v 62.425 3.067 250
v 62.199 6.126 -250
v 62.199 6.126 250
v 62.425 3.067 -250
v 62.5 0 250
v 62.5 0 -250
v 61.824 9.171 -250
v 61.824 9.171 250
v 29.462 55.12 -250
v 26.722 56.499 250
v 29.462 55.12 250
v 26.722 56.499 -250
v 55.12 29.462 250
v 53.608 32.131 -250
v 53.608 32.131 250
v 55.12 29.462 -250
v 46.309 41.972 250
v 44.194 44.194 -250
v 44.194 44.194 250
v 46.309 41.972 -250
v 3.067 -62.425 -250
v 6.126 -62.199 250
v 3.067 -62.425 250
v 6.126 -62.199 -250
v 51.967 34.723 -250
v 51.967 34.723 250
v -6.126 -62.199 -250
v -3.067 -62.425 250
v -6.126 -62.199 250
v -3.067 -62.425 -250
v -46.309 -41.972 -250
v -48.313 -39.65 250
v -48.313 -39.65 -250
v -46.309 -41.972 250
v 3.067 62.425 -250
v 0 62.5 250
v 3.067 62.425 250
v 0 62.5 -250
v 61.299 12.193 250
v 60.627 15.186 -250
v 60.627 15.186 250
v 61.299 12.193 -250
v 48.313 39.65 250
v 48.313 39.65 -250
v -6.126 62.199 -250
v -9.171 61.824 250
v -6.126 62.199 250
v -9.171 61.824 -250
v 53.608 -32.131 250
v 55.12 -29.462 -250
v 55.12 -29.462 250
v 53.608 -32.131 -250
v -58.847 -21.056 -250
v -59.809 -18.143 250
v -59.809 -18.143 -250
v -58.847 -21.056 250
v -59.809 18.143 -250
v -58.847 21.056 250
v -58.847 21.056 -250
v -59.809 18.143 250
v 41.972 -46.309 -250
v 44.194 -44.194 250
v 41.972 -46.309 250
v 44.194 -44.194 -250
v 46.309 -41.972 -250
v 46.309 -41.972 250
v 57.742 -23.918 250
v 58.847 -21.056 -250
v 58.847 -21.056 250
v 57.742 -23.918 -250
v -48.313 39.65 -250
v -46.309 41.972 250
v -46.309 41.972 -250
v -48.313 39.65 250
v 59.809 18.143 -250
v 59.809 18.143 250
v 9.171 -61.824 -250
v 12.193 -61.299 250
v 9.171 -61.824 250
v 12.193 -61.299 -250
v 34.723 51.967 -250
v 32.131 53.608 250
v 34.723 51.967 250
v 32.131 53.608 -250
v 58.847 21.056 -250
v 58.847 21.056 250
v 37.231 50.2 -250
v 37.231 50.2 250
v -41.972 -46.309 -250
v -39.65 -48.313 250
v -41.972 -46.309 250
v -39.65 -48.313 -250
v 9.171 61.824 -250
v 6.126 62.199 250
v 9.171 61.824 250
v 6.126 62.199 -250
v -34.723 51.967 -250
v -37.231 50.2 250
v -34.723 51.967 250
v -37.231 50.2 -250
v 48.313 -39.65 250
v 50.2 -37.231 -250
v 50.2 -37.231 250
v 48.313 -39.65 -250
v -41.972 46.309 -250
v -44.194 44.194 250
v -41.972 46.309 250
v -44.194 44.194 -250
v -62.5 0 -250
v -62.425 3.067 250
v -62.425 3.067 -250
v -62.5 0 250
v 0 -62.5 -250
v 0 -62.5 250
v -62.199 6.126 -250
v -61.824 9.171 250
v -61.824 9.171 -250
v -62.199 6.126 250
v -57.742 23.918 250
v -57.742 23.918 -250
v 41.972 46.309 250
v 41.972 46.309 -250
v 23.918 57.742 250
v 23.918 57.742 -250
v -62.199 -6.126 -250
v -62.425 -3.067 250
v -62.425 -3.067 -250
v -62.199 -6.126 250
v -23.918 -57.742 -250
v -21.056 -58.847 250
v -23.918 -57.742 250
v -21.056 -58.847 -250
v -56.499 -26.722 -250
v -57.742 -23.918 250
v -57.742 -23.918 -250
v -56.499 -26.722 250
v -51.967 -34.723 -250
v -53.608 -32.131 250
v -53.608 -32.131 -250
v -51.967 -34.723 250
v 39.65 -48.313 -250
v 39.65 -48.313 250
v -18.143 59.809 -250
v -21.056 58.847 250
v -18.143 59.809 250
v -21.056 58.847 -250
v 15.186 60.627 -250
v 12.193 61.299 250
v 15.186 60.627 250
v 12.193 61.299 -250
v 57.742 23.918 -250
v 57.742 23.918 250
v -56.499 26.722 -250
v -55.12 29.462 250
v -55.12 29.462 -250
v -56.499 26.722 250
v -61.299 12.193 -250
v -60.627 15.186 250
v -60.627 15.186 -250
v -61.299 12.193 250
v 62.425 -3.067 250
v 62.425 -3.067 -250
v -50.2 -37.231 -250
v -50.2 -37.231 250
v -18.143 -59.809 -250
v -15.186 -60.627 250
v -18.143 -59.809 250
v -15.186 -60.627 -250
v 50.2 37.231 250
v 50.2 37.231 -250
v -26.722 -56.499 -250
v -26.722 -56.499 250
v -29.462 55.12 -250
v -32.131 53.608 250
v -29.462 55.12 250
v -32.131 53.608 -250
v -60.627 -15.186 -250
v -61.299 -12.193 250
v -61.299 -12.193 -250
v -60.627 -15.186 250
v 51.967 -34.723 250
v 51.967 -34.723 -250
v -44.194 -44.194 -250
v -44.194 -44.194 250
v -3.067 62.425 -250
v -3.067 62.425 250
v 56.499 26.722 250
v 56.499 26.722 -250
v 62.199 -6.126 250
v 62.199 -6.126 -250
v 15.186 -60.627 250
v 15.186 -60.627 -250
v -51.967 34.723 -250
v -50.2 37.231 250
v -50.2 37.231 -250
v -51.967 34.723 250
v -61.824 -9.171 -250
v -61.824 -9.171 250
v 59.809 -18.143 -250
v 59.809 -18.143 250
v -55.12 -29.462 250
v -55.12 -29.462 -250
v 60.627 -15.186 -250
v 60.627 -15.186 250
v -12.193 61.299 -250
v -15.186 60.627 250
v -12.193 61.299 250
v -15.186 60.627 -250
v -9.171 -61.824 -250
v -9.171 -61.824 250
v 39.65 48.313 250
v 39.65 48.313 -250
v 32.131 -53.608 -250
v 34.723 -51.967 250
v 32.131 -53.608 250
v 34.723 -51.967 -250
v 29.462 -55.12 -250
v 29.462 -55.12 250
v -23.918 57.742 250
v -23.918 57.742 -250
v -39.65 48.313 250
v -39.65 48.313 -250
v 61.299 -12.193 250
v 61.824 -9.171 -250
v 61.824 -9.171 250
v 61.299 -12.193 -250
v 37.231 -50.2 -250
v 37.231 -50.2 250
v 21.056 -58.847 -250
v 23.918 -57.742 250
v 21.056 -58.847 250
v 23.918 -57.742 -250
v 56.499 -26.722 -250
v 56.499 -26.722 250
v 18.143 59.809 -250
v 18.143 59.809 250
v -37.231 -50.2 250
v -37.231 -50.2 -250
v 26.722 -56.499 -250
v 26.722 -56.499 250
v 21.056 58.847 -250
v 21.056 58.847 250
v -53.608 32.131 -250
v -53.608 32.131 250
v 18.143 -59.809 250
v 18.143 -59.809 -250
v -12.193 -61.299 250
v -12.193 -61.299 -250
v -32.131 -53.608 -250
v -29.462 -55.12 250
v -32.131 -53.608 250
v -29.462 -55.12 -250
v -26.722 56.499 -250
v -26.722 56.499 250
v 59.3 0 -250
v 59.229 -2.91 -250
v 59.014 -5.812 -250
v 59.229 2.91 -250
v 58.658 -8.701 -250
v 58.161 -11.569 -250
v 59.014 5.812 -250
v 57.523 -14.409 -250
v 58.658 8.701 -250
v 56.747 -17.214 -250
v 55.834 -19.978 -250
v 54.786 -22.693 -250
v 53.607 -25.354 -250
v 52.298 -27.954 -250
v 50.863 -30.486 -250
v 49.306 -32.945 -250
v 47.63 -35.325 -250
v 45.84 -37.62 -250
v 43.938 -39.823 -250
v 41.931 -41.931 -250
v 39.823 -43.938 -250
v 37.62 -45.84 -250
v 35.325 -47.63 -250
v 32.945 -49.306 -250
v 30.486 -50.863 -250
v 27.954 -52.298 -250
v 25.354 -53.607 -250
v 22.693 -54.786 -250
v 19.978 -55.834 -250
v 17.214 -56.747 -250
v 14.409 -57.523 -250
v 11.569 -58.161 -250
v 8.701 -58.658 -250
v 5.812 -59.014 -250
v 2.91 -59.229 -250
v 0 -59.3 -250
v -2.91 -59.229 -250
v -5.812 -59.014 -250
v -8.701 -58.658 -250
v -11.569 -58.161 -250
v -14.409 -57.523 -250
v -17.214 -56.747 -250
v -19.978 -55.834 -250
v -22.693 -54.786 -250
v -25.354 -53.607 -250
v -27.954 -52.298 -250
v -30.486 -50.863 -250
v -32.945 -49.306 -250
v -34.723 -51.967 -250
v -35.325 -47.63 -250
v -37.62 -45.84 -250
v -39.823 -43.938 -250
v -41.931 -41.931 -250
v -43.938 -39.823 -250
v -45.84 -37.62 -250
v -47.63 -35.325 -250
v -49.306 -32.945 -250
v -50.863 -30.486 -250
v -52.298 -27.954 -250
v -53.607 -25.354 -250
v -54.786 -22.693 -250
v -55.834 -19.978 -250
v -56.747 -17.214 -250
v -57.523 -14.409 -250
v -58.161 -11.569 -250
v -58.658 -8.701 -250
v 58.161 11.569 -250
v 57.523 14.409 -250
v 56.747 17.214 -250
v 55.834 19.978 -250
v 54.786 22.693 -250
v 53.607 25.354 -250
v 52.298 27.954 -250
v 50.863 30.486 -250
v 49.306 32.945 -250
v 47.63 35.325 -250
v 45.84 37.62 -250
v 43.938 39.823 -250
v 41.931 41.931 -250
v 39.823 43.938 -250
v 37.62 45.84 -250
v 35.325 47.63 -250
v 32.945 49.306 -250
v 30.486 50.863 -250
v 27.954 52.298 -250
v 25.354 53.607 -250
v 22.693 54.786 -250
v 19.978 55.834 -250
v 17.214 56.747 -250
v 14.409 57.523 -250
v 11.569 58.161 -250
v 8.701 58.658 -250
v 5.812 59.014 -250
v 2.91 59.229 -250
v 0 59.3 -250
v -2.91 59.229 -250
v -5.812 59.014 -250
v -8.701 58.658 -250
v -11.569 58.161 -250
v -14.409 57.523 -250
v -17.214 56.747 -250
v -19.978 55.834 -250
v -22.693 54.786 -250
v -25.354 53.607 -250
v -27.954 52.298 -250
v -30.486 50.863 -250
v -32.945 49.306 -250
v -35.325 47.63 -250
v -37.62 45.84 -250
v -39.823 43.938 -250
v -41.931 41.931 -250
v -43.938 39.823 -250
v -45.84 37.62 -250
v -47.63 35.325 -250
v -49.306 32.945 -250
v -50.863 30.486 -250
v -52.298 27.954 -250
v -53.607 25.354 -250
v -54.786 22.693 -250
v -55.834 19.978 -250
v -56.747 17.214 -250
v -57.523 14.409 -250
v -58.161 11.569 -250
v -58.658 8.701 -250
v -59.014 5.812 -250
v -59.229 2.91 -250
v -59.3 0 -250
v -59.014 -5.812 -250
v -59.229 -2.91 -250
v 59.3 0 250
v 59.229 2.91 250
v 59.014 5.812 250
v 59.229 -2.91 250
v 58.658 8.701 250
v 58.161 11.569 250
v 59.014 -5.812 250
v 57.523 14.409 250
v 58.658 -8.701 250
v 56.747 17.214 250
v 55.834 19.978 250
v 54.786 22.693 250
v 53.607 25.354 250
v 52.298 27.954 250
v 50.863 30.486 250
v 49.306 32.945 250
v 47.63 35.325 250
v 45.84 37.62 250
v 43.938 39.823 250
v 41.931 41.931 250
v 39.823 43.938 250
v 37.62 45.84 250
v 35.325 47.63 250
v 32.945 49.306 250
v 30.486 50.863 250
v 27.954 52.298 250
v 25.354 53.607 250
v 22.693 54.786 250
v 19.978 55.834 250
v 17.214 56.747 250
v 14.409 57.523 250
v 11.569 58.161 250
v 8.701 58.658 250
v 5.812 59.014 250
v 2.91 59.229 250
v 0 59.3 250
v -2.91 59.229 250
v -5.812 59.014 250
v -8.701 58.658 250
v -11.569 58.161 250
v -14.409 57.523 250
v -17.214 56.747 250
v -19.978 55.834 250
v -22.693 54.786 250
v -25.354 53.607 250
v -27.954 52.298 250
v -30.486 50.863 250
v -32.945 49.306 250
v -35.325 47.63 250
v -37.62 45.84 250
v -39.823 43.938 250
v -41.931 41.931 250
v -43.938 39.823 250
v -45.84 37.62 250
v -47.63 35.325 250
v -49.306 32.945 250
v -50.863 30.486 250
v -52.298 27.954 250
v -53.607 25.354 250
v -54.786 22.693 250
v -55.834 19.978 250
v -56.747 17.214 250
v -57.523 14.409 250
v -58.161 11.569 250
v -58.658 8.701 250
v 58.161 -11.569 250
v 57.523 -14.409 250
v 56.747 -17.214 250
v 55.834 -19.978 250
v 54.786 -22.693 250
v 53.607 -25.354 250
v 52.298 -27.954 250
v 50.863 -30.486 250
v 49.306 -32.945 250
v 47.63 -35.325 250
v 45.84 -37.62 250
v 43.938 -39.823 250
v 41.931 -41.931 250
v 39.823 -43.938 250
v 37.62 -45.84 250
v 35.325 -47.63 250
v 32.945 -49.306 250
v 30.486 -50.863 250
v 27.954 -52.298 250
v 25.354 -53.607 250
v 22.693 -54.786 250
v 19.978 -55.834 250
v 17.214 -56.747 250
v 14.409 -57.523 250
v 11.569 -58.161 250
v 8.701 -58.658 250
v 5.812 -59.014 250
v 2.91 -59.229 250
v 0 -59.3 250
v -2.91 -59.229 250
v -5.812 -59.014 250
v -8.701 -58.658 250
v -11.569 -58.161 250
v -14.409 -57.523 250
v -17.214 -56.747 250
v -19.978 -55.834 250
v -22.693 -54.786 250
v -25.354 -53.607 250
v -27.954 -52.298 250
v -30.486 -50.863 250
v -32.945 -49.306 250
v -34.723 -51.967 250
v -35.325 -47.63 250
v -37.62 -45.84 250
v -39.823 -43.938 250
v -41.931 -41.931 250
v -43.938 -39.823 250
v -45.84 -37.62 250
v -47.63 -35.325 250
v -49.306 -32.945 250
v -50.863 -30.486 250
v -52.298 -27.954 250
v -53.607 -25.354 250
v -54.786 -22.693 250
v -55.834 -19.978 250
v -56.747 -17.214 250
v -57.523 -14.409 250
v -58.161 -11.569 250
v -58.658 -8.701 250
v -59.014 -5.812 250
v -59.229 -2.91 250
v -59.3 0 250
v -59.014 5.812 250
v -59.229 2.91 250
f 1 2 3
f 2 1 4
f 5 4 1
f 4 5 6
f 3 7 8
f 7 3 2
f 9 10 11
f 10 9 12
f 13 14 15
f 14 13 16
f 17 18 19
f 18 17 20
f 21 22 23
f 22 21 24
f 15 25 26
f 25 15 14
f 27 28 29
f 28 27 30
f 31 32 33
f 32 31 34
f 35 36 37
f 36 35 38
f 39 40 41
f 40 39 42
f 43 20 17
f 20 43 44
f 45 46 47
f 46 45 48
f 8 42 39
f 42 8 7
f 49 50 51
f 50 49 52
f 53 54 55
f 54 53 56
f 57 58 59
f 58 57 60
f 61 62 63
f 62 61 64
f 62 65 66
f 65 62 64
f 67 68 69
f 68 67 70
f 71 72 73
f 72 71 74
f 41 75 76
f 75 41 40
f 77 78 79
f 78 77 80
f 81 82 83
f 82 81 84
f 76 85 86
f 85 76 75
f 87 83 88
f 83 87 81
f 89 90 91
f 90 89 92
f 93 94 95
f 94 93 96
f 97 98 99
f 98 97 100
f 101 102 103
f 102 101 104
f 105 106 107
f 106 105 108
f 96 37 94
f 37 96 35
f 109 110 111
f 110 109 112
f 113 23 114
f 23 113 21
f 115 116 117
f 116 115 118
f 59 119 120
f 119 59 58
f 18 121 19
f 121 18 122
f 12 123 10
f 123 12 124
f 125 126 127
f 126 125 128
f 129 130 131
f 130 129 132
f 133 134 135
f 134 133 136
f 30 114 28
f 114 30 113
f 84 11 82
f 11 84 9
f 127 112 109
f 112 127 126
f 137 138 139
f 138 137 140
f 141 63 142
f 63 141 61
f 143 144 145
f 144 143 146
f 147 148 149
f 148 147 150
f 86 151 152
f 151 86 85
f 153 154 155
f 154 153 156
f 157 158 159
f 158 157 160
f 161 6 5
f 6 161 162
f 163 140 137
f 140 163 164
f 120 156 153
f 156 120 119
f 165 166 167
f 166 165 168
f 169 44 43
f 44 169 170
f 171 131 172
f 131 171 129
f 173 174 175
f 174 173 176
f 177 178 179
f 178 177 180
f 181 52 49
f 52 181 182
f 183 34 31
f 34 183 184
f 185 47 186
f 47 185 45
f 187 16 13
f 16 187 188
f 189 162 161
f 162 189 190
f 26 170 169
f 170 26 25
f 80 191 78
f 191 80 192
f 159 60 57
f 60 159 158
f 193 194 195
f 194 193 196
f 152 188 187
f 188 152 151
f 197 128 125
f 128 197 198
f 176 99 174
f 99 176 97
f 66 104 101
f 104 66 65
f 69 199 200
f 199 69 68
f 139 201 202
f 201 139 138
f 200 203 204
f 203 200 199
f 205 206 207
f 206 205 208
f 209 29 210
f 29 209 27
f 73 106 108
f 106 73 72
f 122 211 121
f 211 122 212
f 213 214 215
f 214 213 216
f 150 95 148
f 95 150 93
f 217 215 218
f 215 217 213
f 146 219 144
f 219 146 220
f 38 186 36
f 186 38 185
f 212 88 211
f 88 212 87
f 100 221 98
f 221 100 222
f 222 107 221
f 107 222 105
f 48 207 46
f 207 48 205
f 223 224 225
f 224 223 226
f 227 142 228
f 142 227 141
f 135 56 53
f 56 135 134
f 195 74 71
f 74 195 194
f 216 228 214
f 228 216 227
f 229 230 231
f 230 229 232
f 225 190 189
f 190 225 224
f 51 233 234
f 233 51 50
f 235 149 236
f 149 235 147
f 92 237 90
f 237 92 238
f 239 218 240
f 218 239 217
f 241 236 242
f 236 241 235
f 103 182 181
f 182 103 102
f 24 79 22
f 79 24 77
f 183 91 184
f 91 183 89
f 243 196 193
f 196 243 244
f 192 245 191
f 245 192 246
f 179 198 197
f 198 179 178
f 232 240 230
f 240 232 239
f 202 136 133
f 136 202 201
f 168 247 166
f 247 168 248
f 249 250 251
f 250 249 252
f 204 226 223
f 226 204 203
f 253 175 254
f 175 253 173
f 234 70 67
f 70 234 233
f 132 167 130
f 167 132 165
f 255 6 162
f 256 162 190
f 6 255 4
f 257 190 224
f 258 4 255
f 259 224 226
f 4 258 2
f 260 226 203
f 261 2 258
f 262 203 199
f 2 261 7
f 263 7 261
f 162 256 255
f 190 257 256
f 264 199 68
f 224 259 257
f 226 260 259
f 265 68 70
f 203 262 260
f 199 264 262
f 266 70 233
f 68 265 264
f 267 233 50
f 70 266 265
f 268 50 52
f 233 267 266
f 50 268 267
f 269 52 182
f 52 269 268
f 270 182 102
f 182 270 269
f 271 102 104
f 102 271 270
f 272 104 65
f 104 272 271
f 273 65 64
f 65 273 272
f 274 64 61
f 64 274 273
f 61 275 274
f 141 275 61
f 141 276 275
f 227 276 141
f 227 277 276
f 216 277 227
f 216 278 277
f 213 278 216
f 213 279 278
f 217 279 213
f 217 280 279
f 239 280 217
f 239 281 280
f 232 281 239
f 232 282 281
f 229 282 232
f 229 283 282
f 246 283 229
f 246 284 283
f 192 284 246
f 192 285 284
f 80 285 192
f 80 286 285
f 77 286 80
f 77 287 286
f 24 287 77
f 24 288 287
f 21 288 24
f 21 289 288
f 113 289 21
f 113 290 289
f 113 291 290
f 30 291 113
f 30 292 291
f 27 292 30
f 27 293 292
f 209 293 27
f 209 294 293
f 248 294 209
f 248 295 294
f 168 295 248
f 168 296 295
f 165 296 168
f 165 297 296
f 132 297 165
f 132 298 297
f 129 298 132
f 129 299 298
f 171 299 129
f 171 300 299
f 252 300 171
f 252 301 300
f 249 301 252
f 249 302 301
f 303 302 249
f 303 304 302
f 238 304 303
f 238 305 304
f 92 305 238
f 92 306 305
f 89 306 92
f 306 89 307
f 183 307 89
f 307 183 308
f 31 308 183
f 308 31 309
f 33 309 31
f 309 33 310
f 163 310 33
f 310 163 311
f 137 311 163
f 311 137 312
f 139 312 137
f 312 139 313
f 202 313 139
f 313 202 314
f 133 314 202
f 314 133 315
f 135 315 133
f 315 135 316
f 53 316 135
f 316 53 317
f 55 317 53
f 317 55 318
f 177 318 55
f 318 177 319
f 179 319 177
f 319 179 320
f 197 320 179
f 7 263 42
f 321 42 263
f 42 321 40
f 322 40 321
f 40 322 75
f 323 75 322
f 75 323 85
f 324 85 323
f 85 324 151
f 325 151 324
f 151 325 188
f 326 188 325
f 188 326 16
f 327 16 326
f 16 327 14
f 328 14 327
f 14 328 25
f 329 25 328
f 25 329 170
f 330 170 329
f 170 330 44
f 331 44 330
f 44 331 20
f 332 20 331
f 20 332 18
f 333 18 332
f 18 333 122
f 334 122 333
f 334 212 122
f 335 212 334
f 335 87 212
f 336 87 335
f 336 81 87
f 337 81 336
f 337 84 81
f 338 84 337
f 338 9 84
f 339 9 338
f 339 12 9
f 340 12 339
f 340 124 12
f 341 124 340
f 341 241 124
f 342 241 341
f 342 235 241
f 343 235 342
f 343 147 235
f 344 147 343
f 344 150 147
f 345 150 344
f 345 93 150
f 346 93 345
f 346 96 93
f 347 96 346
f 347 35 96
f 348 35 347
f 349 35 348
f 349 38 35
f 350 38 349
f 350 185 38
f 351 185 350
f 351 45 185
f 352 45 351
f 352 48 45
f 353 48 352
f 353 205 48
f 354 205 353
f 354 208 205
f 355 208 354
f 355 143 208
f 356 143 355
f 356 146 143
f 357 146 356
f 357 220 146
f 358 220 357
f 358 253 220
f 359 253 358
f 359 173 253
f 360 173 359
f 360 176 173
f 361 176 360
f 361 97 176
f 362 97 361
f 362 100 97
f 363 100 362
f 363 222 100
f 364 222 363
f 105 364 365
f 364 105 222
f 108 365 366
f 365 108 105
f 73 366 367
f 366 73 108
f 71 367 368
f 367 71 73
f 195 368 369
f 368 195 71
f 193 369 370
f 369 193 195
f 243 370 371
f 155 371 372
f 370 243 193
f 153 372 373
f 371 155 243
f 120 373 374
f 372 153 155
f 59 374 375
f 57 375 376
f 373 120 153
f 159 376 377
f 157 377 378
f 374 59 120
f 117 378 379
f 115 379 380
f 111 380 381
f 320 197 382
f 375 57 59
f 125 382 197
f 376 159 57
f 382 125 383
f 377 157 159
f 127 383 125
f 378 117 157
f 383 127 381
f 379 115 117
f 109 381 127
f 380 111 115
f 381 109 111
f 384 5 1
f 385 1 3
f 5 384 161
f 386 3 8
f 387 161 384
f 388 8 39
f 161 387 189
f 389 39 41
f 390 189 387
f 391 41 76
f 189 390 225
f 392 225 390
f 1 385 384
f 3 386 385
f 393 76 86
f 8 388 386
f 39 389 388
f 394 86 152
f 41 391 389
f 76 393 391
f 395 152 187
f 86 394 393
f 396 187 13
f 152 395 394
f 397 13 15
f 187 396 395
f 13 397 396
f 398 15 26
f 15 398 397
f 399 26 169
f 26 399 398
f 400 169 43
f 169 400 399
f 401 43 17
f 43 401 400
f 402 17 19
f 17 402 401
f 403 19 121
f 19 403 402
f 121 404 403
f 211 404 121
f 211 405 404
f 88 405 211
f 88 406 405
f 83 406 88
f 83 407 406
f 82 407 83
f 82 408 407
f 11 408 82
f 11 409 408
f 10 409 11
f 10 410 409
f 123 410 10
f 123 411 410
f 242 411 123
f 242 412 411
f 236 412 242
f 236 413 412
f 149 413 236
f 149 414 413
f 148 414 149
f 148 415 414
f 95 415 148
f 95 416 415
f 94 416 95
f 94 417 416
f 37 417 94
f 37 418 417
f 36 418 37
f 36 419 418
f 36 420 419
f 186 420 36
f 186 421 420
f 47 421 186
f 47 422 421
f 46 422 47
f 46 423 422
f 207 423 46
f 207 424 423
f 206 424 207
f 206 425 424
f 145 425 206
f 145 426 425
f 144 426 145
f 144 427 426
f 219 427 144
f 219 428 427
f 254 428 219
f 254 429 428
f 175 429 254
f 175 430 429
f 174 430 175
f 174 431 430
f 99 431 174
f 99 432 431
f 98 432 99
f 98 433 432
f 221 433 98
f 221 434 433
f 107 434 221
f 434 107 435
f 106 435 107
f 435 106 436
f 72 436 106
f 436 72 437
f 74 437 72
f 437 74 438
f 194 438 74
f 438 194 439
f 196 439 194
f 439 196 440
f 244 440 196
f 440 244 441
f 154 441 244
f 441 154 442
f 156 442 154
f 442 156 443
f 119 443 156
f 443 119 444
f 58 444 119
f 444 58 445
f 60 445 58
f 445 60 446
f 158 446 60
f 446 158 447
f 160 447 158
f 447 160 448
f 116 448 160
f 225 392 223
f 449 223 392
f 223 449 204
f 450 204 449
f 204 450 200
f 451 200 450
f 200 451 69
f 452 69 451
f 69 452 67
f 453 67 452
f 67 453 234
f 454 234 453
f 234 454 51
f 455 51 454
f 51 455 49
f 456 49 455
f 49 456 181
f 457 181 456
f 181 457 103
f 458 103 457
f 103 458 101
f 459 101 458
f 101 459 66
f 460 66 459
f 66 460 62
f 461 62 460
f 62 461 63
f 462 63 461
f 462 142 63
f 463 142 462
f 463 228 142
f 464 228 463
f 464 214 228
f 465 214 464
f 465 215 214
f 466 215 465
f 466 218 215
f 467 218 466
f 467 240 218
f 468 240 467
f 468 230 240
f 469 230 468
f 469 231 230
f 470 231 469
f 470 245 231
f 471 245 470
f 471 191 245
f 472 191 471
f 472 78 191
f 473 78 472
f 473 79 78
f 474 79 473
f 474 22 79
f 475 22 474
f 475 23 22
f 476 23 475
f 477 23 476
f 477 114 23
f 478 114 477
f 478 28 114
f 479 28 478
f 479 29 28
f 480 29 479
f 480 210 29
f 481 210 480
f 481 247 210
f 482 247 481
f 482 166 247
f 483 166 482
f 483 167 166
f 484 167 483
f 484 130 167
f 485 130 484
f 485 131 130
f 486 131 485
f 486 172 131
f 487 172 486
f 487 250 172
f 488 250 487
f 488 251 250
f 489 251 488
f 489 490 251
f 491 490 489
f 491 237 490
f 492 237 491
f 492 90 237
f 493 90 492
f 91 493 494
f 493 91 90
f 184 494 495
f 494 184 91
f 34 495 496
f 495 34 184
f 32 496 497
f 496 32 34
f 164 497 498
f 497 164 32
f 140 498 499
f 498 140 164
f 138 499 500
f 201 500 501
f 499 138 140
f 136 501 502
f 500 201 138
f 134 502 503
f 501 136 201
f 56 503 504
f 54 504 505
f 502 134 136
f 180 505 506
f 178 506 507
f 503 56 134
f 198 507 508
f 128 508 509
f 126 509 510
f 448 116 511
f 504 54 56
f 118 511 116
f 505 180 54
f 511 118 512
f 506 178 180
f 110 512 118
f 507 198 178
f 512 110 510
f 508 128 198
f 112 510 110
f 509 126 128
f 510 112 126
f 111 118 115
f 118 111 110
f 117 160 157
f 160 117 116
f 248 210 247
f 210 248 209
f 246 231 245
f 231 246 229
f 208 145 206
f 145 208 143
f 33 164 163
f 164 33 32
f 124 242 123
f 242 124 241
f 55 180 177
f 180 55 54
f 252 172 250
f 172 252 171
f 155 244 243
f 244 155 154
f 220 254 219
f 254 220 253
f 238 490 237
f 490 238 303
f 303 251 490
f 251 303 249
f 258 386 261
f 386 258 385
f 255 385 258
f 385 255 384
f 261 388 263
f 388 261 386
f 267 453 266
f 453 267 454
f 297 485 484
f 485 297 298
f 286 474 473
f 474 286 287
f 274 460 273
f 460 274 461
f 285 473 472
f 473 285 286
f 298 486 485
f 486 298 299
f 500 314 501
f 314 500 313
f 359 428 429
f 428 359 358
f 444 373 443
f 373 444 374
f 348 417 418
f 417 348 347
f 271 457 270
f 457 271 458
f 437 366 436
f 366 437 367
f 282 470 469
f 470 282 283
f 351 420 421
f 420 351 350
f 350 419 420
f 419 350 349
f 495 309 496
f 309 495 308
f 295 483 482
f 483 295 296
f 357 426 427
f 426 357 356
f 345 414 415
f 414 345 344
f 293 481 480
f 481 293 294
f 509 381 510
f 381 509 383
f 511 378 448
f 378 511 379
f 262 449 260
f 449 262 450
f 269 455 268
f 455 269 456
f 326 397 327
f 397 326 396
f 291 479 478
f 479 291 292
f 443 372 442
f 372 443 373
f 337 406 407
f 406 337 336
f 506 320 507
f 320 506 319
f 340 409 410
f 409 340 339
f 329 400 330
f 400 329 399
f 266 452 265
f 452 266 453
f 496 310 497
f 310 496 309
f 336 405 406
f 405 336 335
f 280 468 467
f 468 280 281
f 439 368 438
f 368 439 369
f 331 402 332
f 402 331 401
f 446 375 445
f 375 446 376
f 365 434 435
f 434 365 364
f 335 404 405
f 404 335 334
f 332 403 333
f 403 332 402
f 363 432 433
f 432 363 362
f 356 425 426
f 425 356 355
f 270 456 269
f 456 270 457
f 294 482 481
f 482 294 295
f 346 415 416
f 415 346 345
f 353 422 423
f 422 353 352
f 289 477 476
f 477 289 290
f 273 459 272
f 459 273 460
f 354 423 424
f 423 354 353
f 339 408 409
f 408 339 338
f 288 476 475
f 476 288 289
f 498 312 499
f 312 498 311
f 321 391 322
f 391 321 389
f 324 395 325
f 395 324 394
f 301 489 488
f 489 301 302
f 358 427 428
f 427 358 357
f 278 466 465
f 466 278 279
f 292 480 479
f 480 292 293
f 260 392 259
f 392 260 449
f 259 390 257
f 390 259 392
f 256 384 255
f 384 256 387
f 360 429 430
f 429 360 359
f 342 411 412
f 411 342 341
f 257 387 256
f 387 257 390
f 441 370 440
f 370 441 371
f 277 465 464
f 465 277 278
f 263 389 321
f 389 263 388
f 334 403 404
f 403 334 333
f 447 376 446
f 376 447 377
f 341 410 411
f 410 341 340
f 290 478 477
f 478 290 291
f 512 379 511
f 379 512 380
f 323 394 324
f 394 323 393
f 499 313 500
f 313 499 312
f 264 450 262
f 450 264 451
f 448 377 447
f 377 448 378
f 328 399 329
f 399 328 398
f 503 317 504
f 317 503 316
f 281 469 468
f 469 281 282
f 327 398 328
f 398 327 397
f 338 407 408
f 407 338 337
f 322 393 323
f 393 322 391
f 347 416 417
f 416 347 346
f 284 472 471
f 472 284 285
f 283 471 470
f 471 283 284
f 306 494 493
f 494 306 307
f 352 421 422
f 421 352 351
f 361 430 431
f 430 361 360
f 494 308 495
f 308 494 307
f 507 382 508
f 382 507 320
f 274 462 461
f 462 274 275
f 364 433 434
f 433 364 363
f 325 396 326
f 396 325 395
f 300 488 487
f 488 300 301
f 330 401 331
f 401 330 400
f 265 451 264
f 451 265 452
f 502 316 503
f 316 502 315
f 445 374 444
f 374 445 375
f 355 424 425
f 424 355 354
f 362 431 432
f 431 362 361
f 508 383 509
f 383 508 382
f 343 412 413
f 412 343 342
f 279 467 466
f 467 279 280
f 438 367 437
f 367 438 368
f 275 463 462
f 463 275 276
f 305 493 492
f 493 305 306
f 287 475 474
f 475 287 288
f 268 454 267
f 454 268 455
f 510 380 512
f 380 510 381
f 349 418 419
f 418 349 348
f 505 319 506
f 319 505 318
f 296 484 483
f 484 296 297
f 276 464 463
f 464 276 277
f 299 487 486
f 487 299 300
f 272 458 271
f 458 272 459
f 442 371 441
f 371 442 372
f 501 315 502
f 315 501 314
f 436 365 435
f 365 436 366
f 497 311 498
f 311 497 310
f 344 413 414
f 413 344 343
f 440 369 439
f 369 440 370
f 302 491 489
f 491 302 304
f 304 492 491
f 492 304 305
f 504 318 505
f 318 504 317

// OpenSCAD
$fn=128;

module ht_pipe(od=125, length=500, wall=3.2) {
    id = od - 2*wall;
    difference() {
        cylinder(h=length, d=od, center=true);
        cylinder(h=length+2, d=id, center=true);
    }
}

ht_pipe(od=125, length=500, wall=3.2);
